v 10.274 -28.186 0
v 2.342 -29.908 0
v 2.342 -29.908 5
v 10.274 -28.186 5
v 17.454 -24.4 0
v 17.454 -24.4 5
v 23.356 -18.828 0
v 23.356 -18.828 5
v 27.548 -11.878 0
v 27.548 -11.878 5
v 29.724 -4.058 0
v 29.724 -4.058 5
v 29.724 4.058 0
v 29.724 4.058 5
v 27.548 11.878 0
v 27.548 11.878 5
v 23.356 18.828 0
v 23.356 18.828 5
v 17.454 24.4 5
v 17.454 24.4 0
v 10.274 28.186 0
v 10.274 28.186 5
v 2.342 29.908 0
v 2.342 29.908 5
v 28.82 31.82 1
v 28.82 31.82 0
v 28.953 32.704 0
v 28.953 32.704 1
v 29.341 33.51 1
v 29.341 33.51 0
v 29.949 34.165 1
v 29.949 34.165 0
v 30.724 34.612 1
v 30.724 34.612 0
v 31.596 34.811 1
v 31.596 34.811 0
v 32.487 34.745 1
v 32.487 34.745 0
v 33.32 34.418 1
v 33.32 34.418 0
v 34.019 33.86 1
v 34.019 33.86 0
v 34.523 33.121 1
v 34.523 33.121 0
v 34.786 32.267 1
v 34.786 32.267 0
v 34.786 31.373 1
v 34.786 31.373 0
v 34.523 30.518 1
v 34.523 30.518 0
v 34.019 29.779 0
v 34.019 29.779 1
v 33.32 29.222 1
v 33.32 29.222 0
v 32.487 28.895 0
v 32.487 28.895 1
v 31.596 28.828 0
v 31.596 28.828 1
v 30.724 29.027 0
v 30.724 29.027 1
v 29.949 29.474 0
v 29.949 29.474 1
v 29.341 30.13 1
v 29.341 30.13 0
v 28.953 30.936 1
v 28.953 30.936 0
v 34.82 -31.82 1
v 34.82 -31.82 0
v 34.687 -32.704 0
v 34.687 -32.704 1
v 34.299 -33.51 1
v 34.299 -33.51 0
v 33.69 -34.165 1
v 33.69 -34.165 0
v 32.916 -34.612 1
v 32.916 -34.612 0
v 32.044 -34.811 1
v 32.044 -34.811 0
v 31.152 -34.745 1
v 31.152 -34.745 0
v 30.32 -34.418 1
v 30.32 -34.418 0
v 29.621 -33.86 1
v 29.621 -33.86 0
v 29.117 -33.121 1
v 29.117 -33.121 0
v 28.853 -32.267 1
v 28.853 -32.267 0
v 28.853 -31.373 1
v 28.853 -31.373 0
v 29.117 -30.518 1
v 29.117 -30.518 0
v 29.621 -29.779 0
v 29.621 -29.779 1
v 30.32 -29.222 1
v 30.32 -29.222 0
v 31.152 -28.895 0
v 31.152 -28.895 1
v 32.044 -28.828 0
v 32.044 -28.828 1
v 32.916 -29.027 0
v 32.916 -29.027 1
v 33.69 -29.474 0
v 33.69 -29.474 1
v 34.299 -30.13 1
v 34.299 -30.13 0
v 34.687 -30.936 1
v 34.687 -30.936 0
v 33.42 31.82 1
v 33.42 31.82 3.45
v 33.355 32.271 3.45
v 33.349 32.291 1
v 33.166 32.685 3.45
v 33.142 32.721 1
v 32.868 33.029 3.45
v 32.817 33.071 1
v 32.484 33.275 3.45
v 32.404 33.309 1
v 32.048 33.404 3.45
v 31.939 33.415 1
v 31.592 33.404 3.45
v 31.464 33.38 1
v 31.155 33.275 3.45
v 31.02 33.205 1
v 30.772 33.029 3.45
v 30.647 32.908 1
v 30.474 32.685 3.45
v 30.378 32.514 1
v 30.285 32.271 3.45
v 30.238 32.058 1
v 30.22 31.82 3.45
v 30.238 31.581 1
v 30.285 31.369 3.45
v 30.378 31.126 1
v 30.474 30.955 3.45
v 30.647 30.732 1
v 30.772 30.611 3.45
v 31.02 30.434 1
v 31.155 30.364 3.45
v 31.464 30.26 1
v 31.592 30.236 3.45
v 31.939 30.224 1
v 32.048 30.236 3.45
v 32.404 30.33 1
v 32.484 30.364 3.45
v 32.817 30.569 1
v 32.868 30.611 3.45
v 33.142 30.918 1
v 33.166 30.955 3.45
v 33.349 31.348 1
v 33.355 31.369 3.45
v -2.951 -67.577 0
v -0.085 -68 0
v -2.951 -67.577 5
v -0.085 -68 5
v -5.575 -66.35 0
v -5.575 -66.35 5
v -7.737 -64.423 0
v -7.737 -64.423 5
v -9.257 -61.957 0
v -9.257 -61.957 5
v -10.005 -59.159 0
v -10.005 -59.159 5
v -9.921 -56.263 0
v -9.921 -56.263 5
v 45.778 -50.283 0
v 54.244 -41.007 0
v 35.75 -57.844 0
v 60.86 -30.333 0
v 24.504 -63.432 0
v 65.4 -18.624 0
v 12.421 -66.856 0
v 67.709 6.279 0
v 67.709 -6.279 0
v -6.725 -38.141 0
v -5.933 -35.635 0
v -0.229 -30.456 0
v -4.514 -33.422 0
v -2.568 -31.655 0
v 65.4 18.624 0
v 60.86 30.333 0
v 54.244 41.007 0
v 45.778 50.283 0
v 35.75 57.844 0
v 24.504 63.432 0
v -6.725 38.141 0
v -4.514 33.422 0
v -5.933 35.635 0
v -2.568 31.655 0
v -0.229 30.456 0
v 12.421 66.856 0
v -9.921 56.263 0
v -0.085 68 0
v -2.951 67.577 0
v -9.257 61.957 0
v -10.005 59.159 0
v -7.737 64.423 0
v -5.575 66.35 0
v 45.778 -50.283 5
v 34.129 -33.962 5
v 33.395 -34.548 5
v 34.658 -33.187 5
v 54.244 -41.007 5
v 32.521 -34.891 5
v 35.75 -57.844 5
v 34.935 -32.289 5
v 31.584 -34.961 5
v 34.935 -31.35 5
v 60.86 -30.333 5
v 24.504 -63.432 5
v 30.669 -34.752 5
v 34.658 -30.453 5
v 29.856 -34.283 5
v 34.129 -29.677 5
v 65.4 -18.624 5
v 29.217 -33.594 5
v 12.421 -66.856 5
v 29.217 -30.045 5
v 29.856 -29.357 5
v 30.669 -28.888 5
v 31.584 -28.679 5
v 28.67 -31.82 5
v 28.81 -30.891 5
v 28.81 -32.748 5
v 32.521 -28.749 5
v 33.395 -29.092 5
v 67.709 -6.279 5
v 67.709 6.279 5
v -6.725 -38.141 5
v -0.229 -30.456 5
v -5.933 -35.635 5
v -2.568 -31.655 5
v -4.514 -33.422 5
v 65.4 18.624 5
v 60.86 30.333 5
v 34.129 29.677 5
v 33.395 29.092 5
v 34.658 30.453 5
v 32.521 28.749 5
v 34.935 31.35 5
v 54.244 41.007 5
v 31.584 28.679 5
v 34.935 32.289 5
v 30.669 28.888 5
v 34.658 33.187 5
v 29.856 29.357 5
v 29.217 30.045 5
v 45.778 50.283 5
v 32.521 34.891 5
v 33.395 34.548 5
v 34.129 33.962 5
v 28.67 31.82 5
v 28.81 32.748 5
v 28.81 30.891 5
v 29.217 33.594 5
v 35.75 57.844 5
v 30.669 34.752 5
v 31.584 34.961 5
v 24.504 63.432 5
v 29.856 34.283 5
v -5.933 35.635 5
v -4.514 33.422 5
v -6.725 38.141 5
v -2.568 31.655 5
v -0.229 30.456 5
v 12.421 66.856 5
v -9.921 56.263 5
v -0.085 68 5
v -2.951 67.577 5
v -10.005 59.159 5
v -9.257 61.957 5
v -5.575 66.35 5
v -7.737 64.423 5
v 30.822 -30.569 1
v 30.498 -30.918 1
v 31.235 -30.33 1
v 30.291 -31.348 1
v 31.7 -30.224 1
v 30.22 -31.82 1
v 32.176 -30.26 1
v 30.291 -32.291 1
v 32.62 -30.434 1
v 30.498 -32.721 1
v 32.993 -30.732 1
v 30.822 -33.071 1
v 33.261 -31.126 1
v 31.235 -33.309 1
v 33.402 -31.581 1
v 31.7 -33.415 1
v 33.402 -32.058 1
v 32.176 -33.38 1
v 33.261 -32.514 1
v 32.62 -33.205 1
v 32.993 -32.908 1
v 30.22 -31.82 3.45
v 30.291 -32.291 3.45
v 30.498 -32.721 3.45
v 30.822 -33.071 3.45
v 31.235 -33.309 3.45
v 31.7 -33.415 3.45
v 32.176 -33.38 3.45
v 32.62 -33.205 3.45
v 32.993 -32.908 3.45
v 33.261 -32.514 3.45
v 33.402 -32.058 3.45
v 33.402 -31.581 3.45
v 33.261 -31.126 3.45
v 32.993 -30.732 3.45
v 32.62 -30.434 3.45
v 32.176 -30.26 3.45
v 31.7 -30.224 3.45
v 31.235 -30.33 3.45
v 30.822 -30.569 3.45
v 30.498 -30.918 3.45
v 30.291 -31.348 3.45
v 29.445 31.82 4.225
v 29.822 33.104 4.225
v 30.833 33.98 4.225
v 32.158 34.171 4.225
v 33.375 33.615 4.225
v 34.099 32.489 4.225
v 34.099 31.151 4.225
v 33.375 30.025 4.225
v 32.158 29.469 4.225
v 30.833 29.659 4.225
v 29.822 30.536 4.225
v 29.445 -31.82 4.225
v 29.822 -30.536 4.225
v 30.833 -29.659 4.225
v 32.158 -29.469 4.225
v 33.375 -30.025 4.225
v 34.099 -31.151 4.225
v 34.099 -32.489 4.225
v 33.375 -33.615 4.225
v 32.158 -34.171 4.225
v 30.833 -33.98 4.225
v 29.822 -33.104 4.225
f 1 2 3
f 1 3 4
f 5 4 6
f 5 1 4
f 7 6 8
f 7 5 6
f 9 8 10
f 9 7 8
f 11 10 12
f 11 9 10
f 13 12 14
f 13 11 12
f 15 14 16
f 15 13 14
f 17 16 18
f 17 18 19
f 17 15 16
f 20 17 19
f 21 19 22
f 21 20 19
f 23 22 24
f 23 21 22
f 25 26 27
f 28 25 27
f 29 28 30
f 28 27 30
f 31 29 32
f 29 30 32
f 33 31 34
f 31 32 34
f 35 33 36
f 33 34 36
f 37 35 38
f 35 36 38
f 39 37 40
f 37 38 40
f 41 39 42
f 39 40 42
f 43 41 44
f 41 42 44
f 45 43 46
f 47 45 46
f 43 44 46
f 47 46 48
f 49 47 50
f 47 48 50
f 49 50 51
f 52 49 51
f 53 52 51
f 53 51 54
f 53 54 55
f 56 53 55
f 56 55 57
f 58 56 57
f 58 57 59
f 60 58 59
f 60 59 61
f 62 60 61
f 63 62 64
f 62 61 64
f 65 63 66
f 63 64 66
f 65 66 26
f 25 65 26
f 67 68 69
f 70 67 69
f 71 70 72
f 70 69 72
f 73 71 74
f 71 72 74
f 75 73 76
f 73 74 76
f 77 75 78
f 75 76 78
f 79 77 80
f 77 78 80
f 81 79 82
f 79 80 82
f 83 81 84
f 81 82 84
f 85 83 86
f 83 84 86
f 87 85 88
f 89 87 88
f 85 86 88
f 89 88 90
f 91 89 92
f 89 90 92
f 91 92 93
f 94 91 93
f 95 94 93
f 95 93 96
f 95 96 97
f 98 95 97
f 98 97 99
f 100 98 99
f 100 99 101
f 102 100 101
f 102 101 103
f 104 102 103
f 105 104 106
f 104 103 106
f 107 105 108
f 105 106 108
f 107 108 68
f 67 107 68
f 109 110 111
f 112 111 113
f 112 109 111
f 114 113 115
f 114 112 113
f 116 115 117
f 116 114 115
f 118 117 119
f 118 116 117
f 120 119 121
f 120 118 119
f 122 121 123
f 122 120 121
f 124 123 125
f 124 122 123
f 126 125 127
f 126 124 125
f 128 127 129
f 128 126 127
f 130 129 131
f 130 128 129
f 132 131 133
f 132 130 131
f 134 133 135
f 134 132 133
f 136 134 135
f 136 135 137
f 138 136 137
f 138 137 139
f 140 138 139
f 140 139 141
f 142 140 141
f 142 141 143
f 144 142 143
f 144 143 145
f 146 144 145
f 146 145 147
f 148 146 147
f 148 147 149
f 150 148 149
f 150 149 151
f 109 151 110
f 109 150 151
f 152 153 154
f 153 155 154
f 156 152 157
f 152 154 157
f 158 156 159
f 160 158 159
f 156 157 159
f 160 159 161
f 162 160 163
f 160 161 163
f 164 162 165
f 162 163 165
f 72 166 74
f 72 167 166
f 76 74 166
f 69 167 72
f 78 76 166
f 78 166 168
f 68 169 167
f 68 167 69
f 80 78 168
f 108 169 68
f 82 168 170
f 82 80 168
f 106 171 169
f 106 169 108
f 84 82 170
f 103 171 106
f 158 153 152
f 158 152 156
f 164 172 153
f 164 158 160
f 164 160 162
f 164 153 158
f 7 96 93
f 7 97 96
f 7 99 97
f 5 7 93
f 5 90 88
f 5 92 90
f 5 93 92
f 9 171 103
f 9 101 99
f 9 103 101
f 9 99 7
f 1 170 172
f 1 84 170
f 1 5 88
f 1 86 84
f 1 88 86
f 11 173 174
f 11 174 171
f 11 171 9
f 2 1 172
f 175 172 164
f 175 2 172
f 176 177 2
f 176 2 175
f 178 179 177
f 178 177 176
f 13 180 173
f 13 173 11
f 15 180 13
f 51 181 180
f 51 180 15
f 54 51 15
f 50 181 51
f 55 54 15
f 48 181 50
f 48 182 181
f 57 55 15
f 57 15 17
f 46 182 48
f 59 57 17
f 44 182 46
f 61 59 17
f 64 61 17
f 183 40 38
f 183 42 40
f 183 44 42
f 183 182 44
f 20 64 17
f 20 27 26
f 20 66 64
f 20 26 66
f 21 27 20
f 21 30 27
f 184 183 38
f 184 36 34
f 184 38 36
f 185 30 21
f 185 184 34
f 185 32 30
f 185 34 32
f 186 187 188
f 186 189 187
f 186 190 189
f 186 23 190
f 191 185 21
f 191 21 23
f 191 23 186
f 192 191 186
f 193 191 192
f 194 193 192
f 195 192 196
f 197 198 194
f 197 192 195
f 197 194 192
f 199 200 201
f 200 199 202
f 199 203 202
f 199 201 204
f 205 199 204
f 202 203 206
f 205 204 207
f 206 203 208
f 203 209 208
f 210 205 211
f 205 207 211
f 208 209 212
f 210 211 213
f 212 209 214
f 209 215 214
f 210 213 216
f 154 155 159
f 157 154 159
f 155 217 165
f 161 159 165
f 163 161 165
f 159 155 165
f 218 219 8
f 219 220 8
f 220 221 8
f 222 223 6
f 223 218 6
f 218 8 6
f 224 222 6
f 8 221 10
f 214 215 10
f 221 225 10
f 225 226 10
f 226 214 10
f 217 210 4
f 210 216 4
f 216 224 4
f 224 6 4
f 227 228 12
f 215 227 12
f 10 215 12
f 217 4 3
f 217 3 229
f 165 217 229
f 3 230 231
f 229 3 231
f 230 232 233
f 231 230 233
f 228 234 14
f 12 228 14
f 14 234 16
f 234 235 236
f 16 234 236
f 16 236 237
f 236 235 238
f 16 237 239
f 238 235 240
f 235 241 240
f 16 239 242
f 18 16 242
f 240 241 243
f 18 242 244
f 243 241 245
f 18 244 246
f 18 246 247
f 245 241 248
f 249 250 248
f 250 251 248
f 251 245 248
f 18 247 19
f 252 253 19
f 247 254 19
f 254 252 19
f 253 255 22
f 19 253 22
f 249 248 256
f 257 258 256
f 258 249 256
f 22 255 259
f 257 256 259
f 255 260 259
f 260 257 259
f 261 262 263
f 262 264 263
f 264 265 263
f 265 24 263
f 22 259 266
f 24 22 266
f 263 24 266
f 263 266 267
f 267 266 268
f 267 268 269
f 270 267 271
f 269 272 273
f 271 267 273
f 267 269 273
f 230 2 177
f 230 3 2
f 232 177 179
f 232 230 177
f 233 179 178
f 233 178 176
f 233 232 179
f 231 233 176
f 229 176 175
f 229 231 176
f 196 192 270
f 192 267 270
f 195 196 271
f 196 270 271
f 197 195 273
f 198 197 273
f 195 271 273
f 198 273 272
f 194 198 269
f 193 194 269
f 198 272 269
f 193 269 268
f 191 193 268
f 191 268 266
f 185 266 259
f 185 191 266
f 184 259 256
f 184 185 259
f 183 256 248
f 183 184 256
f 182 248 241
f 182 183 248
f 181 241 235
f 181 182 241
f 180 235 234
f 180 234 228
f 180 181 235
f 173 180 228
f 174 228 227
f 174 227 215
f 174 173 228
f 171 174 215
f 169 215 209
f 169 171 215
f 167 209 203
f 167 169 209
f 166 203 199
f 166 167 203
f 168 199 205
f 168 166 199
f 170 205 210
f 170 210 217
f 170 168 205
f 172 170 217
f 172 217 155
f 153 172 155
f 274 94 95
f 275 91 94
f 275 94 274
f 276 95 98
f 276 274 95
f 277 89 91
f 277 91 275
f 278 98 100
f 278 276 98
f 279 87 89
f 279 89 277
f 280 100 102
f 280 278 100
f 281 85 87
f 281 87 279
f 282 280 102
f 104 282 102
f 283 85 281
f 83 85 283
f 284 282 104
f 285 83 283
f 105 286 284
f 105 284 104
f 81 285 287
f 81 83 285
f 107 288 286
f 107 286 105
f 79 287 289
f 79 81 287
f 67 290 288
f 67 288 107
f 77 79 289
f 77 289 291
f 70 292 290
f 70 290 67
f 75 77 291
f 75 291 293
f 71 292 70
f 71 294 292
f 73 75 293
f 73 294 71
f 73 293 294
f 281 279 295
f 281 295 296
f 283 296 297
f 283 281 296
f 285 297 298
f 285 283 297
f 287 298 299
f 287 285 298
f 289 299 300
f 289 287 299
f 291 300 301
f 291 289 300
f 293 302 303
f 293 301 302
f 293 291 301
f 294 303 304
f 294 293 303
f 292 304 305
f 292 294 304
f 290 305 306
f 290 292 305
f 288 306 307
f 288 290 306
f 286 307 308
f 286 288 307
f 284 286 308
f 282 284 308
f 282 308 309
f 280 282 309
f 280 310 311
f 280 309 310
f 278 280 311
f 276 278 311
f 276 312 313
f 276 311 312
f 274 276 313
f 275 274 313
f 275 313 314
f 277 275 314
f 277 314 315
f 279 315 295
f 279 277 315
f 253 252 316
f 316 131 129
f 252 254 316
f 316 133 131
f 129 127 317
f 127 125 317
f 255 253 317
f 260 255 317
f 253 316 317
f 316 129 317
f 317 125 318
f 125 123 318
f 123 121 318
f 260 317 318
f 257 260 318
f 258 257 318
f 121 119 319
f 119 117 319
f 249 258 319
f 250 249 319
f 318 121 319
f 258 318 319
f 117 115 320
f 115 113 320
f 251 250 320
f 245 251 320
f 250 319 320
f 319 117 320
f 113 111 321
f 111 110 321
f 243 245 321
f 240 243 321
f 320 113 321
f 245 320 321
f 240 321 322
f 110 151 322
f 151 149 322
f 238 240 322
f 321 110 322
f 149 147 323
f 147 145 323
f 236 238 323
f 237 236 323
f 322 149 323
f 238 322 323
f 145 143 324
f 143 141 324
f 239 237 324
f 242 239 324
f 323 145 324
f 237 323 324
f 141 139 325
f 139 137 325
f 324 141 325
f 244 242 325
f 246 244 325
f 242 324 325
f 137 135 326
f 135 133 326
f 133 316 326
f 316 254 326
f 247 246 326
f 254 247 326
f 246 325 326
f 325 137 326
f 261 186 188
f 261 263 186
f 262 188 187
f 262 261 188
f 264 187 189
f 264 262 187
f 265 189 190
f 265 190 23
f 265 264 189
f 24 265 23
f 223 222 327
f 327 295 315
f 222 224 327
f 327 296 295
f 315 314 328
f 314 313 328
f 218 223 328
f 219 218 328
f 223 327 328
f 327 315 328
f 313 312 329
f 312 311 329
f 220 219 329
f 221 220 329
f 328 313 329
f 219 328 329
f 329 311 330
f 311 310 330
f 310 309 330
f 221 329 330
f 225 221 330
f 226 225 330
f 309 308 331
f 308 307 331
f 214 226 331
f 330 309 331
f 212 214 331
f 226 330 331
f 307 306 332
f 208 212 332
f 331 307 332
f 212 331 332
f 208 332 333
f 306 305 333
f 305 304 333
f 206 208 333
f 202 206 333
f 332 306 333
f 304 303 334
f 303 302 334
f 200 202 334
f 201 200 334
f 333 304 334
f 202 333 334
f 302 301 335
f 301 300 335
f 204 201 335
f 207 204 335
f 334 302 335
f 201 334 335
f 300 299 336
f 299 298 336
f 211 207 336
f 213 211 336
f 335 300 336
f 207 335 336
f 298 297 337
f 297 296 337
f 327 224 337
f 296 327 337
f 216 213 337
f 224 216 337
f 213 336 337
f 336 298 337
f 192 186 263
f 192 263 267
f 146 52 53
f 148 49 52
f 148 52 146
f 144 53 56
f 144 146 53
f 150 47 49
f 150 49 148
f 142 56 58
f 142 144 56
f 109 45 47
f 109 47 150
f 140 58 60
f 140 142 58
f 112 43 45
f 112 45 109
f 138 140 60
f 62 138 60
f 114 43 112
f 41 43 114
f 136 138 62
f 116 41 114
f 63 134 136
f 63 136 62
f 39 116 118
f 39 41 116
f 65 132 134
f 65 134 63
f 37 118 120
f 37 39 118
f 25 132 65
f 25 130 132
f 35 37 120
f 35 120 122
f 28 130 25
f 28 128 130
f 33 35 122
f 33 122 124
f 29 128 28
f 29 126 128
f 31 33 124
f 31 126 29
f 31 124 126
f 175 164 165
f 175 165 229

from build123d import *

# Parameters (mm, degrees)
SKETCH_1_R                   = 1.6
EXTRUDE_1_DEPTH              = 5
FILLET_1_R                   = 10
HOLE_WIZARD_M3_1_D           = 3.2
HOLE_WIZARD_M3_1_CSINK_D     = 6.3
HOLE_WIZARD_M3_1_CSINK_ANGLE = 90
SKETCH_5_R                   = 3
CUT_EXTRUDE_1_DEPTH          = 1


with BuildPart() as part:
    # ｽｹｯﾁ1 → ﾎﾞｽ - 押し出し1 (new body)
    with BuildSketch(Plane.XY):
        with BuildLine():
            Line((-5.20944533, 29.54423259), (-11.808076081, 66.966927205))
            ThreePointArc((-11.808076081, 66.966927205), (68, 0), (-11.808076081, -66.966927205))
            Line((-11.808076081, -66.966927205), (-5.20944533, -29.54423259))
            ThreePointArc((-5.20944533, -29.54423259), (30, 0), (-5.20944533, 29.54423259))
        make_face()
        with Locations((31.819805153, 31.819805153)):
            Circle(SKETCH_1_R, mode=Mode.SUBTRACT)
        with Locations(Location((31.819805153, -31.819805153, 0), (0, 0, 180))):
            Circle(SKETCH_1_R, mode=Mode.SUBTRACT)
    extrude(amount=EXTRUDE_1_DEPTH)

    # ﾌｨﾚｯﾄ1
    fillet_1_edges = [part.edges().sort_by_distance(p)[0] for p in [
        (-11.808076081, -66.966927205, 2.5),
        (-5.20944533, -29.54423259, 2.5),
        (-5.20944533, 29.54423259, 2.5),
        (-11.808076081, 66.966927205, 2.5),
    ]]
    fillet(fillet_1_edges, radius=FILLET_1_R)

    # M3 丸皿ねじ用皿穴1 (through all)
    with Locations(Plane.XY.offset(5)):
        with Locations((31.819805153, 31.819805153), (31.819805153, -31.819805153)):
            CounterSinkHole(HOLE_WIZARD_M3_1_D / 2, HOLE_WIZARD_M3_1_CSINK_D / 2, counter_sink_angle=HOLE_WIZARD_M3_1_CSINK_ANGLE)

    # ｽｹｯﾁ5 → ｶｯﾄ - 押し出し1 (cut)
    with BuildSketch(Plane(origin=(0, 0, 0), x_dir=(-1, 0, 0), z_dir=(0, 0, -1))):
        with Locations((-31.819805153, 31.819805153)):
            Circle(SKETCH_5_R)
        with Locations(Location((-31.819805153, -31.819805153, 0), (0, 0, 180))):
            Circle(SKETCH_5_R)
    extrude(amount=-CUT_EXTRUDE_1_DEPTH, mode=Mode.SUBTRACT)


solid = part.part
